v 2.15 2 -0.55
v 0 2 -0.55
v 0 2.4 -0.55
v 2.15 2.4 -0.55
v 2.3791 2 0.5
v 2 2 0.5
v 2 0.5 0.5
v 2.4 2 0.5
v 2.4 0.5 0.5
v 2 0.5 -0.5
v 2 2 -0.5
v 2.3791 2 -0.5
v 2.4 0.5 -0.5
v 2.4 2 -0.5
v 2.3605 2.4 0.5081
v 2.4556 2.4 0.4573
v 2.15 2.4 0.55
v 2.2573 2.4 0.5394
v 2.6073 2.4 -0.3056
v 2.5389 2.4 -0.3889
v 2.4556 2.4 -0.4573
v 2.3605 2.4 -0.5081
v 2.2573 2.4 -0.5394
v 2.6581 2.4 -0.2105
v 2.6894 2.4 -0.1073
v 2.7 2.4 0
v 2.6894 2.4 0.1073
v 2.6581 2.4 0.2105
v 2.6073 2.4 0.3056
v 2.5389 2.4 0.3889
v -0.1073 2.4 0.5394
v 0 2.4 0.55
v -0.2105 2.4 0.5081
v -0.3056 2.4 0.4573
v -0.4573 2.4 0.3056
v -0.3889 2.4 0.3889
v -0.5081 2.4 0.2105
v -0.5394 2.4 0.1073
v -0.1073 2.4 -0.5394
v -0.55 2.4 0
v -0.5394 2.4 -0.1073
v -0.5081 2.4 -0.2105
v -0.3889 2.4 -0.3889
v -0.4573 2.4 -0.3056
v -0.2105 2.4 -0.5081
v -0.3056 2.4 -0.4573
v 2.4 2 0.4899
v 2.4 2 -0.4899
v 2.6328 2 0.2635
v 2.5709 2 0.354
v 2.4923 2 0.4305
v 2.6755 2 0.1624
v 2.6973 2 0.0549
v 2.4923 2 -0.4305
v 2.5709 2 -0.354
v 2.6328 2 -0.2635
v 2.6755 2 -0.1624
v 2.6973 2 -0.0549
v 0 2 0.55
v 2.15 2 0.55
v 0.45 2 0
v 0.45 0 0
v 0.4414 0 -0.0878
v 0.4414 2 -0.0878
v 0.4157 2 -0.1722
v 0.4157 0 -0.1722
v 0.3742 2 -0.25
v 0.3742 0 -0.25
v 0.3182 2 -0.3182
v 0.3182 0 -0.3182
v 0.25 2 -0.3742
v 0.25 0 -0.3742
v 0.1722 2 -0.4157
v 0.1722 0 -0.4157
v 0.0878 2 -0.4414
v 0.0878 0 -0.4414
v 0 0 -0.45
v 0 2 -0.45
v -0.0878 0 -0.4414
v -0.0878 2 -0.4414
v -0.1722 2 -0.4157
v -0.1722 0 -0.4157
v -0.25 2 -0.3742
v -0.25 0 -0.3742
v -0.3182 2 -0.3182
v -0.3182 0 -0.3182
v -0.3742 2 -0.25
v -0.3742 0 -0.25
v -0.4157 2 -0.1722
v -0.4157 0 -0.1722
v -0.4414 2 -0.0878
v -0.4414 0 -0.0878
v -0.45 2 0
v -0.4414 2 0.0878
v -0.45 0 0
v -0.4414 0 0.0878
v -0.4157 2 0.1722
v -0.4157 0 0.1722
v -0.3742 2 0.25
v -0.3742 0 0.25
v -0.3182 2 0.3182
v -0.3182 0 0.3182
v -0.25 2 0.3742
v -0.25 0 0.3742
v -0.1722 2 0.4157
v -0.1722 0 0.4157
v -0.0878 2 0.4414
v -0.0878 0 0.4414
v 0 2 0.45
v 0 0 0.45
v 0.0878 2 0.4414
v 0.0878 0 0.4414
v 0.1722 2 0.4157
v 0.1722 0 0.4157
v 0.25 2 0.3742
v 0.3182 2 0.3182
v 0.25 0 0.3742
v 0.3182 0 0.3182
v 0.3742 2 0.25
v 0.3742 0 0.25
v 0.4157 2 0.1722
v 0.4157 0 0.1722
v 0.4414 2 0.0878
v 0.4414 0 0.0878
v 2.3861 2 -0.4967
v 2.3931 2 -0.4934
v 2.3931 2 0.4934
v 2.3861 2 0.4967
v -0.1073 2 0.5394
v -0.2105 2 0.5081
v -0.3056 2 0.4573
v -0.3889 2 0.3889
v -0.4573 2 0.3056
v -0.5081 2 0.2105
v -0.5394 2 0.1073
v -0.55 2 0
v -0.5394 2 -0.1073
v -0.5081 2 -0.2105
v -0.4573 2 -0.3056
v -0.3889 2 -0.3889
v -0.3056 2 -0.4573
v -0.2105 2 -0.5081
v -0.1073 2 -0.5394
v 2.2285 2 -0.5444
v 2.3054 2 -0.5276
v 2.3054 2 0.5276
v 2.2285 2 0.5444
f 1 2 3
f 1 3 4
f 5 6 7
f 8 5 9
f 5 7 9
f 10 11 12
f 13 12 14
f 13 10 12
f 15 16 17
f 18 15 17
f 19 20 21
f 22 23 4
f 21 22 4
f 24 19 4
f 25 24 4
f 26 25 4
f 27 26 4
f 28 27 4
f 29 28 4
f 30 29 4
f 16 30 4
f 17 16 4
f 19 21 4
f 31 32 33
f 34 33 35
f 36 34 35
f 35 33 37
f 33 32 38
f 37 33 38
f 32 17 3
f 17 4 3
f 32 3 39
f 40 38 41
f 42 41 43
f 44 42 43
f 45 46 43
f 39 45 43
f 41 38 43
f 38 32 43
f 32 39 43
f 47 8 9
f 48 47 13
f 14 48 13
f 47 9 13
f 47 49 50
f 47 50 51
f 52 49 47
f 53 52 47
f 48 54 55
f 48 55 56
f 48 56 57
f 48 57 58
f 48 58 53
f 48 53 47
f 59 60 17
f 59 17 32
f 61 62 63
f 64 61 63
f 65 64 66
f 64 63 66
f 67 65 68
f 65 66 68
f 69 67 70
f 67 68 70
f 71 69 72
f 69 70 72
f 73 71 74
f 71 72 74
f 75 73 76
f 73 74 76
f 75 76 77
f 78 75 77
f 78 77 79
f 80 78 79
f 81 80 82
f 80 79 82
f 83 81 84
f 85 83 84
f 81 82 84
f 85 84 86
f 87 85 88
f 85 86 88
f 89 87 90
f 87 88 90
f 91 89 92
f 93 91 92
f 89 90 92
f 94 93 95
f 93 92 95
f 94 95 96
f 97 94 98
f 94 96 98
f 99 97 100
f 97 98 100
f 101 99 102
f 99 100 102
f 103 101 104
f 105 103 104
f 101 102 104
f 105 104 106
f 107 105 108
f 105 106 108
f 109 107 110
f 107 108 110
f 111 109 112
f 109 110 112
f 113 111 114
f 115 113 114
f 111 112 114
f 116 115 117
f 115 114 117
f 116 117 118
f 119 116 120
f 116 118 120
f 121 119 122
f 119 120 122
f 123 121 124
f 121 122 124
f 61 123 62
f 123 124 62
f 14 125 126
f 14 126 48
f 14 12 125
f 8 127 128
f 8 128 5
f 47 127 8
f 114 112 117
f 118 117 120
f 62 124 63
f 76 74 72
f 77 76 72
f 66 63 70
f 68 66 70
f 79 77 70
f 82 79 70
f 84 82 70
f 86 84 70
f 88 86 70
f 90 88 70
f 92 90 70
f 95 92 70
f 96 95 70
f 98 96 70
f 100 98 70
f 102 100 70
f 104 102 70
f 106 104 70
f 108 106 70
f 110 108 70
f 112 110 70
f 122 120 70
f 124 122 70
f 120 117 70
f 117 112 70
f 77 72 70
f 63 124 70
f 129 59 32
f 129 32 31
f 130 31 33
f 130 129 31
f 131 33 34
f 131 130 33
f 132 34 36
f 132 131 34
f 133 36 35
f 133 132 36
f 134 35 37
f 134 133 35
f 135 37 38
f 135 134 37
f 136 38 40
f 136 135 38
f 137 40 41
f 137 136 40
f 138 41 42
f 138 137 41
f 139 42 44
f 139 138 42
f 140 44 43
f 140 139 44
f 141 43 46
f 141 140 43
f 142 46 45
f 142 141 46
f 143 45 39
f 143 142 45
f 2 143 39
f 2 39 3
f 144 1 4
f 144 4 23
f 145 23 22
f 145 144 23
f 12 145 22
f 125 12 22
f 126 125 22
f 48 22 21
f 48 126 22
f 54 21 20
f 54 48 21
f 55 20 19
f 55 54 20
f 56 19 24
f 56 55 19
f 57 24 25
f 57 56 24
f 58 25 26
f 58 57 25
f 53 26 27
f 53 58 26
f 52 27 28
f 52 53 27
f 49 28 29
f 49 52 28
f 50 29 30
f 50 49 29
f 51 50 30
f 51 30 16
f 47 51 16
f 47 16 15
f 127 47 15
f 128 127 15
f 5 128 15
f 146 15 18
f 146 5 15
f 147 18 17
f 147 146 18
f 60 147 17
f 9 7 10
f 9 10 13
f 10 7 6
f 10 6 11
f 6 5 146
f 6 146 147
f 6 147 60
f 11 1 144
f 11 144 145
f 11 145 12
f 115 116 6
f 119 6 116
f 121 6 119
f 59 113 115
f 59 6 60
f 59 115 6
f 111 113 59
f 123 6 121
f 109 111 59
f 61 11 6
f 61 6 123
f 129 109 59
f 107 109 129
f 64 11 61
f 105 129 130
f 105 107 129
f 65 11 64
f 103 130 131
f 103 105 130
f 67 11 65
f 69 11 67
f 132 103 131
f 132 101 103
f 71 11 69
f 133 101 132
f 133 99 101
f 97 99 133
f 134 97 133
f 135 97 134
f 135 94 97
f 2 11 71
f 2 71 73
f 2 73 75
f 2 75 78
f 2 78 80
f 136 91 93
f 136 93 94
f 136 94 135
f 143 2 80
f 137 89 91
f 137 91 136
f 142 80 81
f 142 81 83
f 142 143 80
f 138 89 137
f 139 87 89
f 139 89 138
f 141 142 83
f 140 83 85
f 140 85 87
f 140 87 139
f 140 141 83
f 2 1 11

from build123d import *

# Parameters (mm, degrees)
SKETCH1_R             = 0.45
BOSS_EXTRUDE1_DEPTH   = 2
SKETCH1_W             = 0.4
SKETCH1_H             = 1
BOSS_EXTRUDE1_2_DEPTH = 2
BOSS_EXTRUDE2_DEPTH   = 0.4
SKETCH3_W             = 0.4
SKETCH3_H             = 1
CUT_EXTRUDE1_DEPTH    = 0.5


with BuildPart() as part:
    # Sketch1 → Boss-Extrude1 (new body)
    with BuildSketch(Plane(origin=(0, 0, 0), x_dir=(1, 0, 0), z_dir=(0, 1, 0))):
        Circle(SKETCH1_R)
    extrude(amount=BOSS_EXTRUDE1_DEPTH)



with BuildPart() as body_2:
    # Sketch1 → Boss-Extrude1 2 (new body)
    with BuildSketch(Plane(origin=(0, 0, 0), x_dir=(1, 0, 0), z_dir=(0, 1, 0))):
        with Locations((2.2, 0)):
            Rectangle(SKETCH1_W, SKETCH1_H)
    extrude(amount=BOSS_EXTRUDE1_2_DEPTH)


with BuildPart() as part_1:
    add(part.part)

    add(body_2.part)  # Boss-Extrude2 merges body 2
    # Sketch2 → Boss-Extrude2 (add)
    with BuildSketch(Plane(origin=(0, 2, 0), x_dir=(1, 0, 0), z_dir=(0, 1, 0))):
        with BuildLine():
            Line((0, 0.55), (2.15, 0.55))
            ThreePointArc((2.15, 0.55), (2.7, 0), (2.15, -0.55))
            Line((2.15, -0.55), (0, -0.55))
            ThreePointArc((0, -0.55), (-0.55, 0), (0, 0.55))
        make_face()
    extrude(amount=BOSS_EXTRUDE2_DEPTH)

    # Sketch3 → Cut-Extrude1 (cut)
    with BuildSketch(Plane.XZ):
        with Locations((2.2, 0)):
            Rectangle(SKETCH3_W, SKETCH3_H)
    extrude(amount=-CUT_EXTRUDE1_DEPTH, mode=Mode.SUBTRACT)


solid = part_1.part
